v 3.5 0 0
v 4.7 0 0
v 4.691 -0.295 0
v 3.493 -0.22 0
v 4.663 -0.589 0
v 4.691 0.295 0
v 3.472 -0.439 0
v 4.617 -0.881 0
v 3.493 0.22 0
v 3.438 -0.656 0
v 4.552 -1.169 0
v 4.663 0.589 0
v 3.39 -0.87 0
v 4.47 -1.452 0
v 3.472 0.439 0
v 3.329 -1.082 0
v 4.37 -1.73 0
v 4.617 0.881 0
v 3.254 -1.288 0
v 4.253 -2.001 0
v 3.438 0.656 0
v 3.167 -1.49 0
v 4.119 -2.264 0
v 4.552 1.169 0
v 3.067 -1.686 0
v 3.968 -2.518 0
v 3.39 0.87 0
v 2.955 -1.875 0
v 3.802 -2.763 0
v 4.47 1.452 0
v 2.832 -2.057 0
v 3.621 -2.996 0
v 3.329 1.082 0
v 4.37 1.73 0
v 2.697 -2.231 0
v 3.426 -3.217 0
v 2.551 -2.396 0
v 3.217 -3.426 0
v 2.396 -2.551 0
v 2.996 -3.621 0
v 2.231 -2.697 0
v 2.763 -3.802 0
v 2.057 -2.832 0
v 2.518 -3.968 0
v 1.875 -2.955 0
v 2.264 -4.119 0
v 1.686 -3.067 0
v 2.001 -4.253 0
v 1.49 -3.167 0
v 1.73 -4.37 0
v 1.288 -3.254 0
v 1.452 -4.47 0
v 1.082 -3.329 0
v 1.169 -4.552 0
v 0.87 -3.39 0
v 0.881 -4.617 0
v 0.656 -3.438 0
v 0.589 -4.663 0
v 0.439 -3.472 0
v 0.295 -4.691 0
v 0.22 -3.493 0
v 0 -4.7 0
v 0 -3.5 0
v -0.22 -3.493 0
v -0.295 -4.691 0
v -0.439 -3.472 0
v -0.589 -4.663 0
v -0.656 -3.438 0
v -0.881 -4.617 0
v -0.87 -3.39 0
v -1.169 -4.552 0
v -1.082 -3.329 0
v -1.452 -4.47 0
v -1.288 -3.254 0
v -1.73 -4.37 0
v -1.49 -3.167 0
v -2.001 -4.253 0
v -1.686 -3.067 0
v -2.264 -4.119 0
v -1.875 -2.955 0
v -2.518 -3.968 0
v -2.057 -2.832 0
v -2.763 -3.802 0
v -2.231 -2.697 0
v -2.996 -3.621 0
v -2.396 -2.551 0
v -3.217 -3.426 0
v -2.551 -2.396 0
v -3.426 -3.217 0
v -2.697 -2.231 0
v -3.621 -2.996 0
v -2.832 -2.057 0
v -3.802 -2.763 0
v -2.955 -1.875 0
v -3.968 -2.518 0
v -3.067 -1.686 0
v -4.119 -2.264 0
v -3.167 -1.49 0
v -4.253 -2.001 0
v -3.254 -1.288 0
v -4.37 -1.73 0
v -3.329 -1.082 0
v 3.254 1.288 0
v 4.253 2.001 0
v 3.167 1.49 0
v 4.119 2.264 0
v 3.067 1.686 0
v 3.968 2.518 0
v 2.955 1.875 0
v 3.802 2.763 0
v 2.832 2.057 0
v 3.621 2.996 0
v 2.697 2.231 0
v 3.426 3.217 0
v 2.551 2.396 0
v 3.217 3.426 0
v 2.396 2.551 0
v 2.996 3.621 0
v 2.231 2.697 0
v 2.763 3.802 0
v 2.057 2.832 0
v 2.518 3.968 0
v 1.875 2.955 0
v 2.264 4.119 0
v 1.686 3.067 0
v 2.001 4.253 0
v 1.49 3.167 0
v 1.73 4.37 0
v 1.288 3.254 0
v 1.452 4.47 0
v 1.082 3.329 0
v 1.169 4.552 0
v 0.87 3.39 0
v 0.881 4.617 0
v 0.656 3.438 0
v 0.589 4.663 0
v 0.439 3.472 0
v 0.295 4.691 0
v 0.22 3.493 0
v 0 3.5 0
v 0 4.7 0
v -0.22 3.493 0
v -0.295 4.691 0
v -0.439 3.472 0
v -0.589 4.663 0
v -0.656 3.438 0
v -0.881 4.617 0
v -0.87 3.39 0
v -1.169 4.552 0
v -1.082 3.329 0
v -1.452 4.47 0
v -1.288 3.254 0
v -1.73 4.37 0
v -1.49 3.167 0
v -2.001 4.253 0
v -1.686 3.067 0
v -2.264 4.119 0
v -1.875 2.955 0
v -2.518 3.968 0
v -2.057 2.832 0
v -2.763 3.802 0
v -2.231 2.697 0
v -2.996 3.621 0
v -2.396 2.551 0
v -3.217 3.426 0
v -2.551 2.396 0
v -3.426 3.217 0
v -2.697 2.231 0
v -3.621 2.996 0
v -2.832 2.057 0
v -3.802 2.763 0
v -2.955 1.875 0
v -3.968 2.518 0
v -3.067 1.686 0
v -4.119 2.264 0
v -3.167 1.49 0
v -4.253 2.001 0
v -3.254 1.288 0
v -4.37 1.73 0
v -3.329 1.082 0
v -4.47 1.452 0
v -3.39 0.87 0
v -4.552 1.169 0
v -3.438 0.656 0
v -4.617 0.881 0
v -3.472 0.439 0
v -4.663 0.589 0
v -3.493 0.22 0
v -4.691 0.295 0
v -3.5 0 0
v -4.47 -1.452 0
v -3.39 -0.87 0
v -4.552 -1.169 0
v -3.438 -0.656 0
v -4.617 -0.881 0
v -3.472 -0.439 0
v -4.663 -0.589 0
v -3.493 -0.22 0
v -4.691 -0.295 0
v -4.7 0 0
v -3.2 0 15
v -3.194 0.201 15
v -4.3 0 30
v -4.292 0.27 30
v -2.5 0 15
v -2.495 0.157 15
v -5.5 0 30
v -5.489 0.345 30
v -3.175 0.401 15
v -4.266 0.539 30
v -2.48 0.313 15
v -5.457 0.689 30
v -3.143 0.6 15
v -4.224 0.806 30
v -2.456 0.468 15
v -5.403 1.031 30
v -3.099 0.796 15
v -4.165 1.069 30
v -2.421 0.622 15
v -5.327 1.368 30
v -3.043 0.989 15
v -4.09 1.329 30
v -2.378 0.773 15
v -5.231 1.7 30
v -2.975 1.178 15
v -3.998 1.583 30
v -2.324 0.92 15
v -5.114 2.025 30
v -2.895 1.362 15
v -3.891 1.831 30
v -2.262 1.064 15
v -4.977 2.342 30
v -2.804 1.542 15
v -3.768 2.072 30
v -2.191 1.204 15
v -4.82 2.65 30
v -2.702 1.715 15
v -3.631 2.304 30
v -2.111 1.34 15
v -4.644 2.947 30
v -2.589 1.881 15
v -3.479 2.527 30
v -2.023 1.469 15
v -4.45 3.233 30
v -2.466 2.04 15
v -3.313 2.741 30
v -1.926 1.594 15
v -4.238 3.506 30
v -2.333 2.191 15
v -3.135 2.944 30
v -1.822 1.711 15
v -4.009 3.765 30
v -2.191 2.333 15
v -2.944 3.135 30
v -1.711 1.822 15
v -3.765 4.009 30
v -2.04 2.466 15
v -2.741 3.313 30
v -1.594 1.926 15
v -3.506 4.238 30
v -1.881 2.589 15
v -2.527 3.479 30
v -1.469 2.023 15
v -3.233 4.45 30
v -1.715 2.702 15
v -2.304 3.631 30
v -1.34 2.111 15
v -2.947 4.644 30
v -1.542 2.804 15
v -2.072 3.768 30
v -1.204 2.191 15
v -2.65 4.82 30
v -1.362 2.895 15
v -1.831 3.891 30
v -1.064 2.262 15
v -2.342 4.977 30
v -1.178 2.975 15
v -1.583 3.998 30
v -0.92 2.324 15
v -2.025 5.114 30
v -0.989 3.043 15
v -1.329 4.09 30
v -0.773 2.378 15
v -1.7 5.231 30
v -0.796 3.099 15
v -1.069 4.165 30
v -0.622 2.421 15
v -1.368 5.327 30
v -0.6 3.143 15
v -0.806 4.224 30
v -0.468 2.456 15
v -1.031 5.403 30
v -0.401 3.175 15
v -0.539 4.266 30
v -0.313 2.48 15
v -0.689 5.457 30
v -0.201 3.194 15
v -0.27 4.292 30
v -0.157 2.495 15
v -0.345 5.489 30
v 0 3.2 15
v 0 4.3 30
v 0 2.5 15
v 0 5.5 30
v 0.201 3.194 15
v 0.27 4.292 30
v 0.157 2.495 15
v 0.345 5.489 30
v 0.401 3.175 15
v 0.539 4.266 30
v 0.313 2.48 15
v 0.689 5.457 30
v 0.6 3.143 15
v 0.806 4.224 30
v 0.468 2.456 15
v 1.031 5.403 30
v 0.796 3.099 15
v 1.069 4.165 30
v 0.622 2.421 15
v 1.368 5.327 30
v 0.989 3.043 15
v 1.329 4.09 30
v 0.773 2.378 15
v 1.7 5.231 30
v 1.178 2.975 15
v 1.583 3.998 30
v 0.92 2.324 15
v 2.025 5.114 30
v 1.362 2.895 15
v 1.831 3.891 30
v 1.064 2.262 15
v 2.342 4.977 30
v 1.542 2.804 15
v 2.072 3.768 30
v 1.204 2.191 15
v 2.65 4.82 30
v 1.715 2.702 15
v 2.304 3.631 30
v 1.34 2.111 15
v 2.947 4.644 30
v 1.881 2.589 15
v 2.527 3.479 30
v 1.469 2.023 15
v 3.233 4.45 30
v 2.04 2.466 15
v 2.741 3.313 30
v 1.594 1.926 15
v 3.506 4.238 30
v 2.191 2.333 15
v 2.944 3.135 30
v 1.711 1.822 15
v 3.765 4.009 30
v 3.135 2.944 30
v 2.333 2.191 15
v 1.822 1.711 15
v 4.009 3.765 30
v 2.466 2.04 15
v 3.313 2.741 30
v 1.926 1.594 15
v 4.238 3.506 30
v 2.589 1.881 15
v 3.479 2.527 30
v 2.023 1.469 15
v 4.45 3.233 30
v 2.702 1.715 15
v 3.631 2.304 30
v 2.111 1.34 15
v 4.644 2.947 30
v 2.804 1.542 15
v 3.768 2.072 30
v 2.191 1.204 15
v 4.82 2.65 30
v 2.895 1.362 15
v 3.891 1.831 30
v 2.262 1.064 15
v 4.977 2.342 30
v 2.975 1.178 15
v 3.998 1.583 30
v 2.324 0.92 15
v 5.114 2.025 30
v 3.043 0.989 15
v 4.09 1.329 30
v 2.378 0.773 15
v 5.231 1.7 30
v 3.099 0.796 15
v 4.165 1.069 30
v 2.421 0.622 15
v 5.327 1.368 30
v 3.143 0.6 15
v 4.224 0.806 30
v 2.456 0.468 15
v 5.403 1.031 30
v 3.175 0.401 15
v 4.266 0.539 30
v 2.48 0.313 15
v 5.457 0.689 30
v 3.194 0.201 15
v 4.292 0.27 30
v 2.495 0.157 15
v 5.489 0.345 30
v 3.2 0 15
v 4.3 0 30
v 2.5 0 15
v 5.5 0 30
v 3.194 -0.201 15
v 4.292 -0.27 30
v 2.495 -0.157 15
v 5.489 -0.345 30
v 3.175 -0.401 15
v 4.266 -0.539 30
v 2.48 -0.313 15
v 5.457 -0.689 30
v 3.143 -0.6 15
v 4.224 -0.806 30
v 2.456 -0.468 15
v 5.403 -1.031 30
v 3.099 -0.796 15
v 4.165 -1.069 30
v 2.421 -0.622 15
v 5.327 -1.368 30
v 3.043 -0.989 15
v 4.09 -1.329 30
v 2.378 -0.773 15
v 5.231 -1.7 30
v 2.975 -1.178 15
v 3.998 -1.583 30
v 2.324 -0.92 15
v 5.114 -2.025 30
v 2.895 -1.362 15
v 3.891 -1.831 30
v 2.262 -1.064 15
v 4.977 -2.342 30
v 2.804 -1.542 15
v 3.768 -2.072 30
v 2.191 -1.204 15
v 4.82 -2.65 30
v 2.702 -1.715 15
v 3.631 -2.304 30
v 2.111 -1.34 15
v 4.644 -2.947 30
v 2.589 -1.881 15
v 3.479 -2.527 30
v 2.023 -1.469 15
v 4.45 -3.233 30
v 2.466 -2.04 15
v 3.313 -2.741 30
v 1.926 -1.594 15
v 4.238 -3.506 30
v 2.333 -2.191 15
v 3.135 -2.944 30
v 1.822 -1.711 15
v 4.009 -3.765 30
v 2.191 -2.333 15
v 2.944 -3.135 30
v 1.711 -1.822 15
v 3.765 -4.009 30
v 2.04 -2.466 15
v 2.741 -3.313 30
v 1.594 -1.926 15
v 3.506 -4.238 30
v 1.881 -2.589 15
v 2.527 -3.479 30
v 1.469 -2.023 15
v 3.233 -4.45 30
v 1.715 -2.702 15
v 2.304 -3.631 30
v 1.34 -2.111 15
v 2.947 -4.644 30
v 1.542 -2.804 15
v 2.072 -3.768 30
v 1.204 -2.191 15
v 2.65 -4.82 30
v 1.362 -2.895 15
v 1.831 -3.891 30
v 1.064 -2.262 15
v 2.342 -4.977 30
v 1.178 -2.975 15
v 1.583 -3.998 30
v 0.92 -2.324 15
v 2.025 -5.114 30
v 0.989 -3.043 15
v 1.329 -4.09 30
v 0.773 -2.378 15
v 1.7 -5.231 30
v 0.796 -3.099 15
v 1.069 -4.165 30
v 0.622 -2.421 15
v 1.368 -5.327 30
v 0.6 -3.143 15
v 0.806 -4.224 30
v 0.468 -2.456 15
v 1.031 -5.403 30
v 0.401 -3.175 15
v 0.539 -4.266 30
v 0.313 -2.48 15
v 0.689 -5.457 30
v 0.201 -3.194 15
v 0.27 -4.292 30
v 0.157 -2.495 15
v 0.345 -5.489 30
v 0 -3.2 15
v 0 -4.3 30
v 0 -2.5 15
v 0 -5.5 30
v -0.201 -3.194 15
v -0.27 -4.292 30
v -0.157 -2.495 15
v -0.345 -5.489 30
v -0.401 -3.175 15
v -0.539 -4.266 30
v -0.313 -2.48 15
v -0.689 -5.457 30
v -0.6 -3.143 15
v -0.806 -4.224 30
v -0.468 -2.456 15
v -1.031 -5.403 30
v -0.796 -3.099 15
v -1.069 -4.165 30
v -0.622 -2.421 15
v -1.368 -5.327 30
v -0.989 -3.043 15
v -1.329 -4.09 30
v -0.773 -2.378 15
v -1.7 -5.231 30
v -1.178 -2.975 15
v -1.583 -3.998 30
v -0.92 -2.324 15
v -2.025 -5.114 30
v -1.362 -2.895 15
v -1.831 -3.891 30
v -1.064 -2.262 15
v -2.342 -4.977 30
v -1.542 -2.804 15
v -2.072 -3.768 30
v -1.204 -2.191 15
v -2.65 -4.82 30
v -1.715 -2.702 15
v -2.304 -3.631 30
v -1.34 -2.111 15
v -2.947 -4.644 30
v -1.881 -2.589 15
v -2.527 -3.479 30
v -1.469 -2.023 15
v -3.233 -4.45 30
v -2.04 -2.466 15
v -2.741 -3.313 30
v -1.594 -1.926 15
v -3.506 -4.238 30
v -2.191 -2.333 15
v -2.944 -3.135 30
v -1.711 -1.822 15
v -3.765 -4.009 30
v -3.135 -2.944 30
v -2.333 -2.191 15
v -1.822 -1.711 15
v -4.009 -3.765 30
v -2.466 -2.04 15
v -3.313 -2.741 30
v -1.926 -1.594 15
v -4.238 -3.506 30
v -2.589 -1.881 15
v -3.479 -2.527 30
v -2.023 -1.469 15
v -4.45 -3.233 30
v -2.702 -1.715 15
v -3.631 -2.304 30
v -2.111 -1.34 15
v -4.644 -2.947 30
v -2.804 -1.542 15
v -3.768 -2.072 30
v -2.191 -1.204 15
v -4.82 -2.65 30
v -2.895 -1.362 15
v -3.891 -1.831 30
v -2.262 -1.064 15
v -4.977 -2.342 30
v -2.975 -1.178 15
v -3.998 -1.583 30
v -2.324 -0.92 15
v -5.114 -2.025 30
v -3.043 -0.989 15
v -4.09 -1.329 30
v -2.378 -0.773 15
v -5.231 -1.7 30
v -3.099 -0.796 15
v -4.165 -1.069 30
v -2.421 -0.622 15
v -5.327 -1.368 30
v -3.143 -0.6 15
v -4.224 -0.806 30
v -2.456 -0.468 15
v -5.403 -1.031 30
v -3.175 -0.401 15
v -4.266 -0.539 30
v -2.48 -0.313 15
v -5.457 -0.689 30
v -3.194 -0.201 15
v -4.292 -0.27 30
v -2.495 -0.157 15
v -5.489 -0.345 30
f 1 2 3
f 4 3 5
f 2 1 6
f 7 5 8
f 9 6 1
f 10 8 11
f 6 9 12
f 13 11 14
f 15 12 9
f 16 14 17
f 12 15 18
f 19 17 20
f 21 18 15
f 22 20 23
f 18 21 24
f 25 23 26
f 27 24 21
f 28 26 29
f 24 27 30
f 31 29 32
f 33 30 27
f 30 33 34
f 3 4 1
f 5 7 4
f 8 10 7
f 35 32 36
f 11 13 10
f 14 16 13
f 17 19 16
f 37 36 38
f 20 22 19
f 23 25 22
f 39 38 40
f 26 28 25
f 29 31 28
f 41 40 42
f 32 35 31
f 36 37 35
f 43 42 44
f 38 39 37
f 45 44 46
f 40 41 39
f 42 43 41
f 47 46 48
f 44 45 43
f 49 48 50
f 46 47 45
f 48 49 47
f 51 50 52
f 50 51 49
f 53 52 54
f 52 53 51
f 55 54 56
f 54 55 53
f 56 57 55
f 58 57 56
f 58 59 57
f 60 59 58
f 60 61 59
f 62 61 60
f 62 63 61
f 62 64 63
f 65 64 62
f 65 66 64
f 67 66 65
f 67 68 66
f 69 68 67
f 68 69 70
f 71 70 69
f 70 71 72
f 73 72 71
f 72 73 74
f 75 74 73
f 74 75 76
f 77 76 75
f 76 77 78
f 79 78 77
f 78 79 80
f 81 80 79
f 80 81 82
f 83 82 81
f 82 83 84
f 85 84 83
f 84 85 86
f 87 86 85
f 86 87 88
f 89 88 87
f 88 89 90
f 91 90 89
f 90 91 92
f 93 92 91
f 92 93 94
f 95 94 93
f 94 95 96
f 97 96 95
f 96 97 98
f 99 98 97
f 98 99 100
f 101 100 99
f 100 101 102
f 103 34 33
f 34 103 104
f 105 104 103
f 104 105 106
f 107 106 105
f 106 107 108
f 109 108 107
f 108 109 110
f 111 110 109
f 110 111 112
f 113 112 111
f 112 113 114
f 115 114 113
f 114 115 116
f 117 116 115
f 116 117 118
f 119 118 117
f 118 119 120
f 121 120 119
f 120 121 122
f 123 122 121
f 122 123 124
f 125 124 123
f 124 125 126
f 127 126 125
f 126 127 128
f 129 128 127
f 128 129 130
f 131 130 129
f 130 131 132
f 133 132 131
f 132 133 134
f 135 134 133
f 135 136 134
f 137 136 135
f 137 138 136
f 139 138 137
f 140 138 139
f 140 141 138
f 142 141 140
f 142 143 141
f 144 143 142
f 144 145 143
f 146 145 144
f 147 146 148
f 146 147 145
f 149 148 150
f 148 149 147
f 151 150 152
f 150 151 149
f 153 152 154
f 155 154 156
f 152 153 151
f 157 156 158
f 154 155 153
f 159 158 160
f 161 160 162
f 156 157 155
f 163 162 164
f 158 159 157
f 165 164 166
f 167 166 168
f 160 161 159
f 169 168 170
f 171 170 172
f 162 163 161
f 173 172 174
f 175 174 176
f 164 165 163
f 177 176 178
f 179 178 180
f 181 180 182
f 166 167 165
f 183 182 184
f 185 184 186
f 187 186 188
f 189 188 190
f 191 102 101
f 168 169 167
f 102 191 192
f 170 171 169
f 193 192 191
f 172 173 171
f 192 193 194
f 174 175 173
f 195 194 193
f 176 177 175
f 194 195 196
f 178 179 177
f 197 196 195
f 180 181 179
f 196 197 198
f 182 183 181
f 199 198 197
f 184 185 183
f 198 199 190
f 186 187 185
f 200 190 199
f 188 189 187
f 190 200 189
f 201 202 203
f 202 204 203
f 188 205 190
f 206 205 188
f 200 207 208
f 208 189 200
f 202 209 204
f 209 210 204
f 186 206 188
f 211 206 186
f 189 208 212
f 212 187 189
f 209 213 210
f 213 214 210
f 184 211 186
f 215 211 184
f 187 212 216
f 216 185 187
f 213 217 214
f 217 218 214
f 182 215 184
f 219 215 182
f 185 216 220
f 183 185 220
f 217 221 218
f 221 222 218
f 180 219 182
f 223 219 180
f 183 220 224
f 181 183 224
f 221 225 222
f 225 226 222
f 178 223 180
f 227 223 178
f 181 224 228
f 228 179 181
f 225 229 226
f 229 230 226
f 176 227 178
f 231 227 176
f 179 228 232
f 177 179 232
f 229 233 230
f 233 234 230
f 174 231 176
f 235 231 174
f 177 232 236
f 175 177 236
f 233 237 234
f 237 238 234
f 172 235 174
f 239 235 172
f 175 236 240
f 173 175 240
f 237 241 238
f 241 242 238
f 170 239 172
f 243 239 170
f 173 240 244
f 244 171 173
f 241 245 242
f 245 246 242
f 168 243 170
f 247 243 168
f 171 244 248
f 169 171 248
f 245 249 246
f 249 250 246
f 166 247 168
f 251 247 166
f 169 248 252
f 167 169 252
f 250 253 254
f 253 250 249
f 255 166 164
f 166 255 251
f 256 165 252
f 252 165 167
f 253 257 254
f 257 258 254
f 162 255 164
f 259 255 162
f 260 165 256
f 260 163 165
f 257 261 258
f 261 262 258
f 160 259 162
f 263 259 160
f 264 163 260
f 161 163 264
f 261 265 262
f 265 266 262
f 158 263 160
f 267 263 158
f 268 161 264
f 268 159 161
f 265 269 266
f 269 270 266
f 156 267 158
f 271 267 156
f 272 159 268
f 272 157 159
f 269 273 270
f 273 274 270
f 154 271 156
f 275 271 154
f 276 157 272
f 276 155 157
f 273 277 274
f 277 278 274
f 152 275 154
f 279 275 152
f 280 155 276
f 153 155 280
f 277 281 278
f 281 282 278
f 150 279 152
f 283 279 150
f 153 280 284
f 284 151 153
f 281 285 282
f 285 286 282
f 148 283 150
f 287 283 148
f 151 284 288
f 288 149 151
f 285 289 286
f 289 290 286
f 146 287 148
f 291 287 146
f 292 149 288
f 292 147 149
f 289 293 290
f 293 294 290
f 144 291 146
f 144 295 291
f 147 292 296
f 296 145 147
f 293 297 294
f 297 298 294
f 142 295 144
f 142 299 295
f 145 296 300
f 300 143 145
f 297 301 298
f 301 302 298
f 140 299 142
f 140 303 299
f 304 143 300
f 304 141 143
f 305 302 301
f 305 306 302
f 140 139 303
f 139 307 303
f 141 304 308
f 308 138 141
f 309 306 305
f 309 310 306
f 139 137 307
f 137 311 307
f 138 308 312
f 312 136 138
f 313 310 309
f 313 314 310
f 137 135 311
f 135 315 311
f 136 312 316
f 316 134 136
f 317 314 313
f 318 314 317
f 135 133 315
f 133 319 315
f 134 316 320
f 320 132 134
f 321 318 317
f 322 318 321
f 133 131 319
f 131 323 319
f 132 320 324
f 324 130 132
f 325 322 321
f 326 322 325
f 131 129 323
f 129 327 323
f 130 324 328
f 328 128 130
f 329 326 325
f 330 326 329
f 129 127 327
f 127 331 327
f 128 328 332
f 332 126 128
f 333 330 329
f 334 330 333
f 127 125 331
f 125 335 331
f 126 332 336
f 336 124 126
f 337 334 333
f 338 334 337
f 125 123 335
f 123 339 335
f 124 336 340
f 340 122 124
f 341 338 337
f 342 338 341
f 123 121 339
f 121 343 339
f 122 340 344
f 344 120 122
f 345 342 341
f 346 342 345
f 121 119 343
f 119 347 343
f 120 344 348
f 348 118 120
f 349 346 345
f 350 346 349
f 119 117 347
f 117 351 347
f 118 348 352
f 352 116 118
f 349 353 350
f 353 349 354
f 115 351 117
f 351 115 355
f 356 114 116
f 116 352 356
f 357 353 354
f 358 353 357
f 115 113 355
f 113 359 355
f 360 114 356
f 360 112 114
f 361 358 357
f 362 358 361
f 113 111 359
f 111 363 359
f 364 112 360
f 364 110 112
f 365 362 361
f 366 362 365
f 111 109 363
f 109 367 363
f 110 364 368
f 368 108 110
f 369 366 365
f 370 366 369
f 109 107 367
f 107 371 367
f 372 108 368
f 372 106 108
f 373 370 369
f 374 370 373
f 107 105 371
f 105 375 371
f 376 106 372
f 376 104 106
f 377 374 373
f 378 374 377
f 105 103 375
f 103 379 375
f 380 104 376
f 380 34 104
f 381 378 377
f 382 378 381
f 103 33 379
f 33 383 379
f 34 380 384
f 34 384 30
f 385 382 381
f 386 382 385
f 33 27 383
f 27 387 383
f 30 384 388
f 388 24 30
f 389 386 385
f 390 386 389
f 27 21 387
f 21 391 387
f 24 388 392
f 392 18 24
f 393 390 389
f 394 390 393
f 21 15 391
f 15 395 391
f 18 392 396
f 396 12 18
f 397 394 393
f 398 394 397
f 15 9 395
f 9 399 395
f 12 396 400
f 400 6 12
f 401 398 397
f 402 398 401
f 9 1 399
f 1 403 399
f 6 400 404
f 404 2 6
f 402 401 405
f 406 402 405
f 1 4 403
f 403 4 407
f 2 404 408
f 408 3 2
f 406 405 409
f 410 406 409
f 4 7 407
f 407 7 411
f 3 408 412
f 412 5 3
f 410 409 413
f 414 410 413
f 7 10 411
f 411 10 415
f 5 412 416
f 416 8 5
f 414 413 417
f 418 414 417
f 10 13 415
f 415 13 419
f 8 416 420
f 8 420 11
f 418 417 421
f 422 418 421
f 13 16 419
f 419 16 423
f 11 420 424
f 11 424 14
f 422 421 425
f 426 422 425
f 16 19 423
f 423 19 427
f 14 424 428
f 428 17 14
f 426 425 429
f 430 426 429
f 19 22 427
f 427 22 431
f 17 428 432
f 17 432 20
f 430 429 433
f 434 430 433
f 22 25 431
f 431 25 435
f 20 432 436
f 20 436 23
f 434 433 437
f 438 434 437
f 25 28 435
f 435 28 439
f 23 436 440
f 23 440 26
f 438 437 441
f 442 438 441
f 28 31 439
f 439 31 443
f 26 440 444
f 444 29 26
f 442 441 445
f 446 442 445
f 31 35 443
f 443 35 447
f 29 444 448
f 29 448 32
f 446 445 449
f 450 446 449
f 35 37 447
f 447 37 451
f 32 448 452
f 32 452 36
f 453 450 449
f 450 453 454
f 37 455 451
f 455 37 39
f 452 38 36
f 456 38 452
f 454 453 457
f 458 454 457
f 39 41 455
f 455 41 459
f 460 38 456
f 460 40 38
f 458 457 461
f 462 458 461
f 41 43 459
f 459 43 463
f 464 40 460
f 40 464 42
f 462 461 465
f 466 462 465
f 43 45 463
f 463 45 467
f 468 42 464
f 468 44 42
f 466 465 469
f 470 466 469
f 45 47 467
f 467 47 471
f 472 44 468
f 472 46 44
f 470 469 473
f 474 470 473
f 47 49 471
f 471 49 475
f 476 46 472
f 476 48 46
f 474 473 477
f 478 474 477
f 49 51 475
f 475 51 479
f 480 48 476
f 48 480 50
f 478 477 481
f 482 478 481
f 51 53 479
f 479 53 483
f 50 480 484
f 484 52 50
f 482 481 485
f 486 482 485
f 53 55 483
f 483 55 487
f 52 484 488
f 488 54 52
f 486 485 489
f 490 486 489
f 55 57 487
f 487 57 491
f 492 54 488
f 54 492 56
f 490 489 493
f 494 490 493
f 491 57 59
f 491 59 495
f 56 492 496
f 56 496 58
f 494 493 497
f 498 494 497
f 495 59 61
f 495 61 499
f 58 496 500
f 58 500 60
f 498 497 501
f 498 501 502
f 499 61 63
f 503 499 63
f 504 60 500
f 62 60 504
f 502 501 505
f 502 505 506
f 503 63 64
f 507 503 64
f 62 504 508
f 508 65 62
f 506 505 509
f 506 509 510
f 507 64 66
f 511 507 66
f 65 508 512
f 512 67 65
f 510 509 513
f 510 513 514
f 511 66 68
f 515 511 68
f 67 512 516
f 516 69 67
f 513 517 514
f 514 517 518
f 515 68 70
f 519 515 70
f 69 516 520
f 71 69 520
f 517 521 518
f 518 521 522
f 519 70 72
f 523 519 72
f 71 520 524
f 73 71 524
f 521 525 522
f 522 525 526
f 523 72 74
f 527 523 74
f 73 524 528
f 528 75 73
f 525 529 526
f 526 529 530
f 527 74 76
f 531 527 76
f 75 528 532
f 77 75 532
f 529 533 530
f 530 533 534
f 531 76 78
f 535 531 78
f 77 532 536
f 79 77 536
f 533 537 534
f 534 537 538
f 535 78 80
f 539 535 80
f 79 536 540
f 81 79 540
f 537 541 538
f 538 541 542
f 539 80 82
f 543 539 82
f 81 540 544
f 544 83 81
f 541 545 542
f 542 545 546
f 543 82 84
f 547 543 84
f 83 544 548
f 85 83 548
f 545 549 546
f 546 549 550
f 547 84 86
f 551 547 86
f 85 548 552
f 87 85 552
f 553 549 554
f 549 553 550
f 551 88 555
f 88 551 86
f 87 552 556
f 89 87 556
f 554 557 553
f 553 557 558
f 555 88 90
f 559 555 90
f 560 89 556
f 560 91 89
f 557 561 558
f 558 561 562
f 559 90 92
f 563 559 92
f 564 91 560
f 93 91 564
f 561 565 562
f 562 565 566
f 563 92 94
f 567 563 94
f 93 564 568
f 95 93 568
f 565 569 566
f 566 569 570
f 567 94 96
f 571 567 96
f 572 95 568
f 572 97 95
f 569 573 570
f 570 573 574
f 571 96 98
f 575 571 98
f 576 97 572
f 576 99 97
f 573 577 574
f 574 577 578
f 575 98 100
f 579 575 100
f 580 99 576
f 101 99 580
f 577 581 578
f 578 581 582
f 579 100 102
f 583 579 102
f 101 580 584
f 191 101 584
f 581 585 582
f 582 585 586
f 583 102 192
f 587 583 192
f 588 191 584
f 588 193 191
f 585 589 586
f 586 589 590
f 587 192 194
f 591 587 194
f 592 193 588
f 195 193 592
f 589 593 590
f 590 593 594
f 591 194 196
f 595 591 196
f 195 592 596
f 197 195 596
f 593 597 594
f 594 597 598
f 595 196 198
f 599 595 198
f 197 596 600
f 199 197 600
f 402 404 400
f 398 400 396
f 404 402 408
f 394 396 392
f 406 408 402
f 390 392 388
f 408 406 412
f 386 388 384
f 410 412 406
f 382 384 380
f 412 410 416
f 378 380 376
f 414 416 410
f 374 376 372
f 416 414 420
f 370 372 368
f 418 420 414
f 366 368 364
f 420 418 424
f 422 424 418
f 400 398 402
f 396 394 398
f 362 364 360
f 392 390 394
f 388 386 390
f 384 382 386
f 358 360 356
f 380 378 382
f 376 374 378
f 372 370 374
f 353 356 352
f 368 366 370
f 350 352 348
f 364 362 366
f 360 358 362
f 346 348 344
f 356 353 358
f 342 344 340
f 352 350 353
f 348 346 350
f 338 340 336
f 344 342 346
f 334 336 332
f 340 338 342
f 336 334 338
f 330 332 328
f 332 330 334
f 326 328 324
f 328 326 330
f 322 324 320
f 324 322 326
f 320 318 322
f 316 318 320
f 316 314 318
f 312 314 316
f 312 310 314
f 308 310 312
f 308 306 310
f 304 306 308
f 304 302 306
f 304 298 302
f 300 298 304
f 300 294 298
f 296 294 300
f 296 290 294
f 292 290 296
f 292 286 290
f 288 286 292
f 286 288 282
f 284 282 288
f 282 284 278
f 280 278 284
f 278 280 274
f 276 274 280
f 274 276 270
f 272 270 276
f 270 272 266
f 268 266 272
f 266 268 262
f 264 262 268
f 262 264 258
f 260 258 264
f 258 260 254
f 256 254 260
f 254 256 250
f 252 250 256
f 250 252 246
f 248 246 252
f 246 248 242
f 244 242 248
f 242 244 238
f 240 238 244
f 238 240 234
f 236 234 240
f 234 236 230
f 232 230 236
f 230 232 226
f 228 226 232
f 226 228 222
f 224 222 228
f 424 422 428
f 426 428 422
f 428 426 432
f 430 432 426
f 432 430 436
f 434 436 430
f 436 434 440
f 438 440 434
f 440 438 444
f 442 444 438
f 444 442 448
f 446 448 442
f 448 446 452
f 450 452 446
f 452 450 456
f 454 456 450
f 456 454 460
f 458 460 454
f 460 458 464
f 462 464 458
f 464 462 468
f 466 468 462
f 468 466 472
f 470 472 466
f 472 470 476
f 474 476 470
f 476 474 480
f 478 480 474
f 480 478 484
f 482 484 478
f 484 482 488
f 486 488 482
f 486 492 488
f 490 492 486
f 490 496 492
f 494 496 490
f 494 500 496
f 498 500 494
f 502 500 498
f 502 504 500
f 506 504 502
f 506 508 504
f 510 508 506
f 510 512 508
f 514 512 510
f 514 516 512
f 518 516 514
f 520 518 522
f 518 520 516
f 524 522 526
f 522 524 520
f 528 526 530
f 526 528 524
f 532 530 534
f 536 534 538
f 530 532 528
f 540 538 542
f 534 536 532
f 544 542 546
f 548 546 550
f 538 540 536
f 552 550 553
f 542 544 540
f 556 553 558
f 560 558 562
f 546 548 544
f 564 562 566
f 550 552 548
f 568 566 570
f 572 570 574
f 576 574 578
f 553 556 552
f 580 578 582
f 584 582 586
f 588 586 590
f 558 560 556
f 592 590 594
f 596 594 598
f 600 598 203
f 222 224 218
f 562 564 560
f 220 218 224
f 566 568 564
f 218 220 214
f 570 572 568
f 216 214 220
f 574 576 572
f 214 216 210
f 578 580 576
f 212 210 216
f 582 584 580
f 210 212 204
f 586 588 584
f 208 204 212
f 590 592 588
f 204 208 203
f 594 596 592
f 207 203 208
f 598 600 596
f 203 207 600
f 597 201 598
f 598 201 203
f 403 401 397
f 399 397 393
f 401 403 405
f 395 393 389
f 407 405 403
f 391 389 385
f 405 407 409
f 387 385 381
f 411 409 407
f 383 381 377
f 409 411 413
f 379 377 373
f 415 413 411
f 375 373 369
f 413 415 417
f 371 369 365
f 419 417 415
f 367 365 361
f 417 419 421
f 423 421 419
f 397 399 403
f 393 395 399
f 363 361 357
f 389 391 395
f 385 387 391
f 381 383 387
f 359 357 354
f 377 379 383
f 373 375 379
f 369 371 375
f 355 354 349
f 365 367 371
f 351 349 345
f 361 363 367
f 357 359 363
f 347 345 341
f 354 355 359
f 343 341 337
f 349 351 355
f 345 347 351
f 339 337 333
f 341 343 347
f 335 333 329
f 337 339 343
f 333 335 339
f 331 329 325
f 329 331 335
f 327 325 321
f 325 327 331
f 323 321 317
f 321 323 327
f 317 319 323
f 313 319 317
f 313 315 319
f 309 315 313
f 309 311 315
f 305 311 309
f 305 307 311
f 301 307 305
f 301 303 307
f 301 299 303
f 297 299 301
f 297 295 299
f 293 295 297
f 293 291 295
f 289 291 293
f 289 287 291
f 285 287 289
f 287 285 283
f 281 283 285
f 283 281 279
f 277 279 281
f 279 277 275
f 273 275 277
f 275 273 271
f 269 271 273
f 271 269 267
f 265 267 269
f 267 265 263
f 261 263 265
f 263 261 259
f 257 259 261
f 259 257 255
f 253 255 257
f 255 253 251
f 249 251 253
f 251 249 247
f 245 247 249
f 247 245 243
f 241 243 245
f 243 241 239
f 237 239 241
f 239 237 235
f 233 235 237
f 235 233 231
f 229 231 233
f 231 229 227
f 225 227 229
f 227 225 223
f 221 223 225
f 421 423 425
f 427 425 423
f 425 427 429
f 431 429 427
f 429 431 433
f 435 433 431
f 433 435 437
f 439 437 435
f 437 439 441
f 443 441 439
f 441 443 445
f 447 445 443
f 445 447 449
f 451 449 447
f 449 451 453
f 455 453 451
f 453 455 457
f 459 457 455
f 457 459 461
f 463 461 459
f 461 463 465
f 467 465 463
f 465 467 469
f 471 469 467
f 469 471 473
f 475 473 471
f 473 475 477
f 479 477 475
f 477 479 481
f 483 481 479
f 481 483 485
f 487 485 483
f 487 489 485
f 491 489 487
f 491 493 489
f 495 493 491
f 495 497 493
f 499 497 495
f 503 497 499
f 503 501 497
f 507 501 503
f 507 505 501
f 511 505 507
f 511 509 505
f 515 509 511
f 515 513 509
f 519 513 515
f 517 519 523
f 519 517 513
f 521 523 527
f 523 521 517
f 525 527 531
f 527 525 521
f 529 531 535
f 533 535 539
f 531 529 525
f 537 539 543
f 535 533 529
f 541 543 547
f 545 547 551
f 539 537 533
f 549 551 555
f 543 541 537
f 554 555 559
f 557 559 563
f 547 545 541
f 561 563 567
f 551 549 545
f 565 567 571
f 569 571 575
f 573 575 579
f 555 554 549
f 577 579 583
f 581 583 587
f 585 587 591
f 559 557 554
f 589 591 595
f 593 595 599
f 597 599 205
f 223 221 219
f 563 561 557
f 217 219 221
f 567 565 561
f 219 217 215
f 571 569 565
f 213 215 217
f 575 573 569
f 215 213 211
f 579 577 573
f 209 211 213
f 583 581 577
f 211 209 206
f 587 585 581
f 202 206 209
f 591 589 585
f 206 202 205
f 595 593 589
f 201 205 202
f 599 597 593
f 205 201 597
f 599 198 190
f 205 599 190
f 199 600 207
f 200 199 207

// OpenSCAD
joint_d=7;
joint_d_smaller=5;
joint_r=joint_d/2;
joint_r_smaller=joint_d_smaller/2;
//joint_smaller_inner_r=1;

filter_d=8.6;
//old -> filter_d_smaller=7.8;
filter_d_smaller=6.4;
filter_r=filter_d/2;
filter_r_smaller=filter_d_smaller/2;
//joint_filter_inner_r=0.25;
width = 1.2;

joint_h=15;
filter_h=15;

sum_h=joint_h+filter_h;

rotate_extrude($fn=100) 
polygon( points=[[joint_r,0],
    [joint_r_smaller,joint_h],

    [filter_r_smaller,joint_h],
    [filter_r,sum_h],

    [filter_r+width,sum_h],
    //[filter_d+width,joint_h],
    //[joint_d+width,joint_h],
    [joint_r+width,0]
] );


print_stabilizer_r=0; //set 0 for null
 scale([1,1,0.3]) difference(){
    linear_extrude(height=1) circle($fn = 100, r = joint_r+width+print_stabilizer_r);
    linear_extrude(height=1) circle($fn = 100, r = joint_r);
}
